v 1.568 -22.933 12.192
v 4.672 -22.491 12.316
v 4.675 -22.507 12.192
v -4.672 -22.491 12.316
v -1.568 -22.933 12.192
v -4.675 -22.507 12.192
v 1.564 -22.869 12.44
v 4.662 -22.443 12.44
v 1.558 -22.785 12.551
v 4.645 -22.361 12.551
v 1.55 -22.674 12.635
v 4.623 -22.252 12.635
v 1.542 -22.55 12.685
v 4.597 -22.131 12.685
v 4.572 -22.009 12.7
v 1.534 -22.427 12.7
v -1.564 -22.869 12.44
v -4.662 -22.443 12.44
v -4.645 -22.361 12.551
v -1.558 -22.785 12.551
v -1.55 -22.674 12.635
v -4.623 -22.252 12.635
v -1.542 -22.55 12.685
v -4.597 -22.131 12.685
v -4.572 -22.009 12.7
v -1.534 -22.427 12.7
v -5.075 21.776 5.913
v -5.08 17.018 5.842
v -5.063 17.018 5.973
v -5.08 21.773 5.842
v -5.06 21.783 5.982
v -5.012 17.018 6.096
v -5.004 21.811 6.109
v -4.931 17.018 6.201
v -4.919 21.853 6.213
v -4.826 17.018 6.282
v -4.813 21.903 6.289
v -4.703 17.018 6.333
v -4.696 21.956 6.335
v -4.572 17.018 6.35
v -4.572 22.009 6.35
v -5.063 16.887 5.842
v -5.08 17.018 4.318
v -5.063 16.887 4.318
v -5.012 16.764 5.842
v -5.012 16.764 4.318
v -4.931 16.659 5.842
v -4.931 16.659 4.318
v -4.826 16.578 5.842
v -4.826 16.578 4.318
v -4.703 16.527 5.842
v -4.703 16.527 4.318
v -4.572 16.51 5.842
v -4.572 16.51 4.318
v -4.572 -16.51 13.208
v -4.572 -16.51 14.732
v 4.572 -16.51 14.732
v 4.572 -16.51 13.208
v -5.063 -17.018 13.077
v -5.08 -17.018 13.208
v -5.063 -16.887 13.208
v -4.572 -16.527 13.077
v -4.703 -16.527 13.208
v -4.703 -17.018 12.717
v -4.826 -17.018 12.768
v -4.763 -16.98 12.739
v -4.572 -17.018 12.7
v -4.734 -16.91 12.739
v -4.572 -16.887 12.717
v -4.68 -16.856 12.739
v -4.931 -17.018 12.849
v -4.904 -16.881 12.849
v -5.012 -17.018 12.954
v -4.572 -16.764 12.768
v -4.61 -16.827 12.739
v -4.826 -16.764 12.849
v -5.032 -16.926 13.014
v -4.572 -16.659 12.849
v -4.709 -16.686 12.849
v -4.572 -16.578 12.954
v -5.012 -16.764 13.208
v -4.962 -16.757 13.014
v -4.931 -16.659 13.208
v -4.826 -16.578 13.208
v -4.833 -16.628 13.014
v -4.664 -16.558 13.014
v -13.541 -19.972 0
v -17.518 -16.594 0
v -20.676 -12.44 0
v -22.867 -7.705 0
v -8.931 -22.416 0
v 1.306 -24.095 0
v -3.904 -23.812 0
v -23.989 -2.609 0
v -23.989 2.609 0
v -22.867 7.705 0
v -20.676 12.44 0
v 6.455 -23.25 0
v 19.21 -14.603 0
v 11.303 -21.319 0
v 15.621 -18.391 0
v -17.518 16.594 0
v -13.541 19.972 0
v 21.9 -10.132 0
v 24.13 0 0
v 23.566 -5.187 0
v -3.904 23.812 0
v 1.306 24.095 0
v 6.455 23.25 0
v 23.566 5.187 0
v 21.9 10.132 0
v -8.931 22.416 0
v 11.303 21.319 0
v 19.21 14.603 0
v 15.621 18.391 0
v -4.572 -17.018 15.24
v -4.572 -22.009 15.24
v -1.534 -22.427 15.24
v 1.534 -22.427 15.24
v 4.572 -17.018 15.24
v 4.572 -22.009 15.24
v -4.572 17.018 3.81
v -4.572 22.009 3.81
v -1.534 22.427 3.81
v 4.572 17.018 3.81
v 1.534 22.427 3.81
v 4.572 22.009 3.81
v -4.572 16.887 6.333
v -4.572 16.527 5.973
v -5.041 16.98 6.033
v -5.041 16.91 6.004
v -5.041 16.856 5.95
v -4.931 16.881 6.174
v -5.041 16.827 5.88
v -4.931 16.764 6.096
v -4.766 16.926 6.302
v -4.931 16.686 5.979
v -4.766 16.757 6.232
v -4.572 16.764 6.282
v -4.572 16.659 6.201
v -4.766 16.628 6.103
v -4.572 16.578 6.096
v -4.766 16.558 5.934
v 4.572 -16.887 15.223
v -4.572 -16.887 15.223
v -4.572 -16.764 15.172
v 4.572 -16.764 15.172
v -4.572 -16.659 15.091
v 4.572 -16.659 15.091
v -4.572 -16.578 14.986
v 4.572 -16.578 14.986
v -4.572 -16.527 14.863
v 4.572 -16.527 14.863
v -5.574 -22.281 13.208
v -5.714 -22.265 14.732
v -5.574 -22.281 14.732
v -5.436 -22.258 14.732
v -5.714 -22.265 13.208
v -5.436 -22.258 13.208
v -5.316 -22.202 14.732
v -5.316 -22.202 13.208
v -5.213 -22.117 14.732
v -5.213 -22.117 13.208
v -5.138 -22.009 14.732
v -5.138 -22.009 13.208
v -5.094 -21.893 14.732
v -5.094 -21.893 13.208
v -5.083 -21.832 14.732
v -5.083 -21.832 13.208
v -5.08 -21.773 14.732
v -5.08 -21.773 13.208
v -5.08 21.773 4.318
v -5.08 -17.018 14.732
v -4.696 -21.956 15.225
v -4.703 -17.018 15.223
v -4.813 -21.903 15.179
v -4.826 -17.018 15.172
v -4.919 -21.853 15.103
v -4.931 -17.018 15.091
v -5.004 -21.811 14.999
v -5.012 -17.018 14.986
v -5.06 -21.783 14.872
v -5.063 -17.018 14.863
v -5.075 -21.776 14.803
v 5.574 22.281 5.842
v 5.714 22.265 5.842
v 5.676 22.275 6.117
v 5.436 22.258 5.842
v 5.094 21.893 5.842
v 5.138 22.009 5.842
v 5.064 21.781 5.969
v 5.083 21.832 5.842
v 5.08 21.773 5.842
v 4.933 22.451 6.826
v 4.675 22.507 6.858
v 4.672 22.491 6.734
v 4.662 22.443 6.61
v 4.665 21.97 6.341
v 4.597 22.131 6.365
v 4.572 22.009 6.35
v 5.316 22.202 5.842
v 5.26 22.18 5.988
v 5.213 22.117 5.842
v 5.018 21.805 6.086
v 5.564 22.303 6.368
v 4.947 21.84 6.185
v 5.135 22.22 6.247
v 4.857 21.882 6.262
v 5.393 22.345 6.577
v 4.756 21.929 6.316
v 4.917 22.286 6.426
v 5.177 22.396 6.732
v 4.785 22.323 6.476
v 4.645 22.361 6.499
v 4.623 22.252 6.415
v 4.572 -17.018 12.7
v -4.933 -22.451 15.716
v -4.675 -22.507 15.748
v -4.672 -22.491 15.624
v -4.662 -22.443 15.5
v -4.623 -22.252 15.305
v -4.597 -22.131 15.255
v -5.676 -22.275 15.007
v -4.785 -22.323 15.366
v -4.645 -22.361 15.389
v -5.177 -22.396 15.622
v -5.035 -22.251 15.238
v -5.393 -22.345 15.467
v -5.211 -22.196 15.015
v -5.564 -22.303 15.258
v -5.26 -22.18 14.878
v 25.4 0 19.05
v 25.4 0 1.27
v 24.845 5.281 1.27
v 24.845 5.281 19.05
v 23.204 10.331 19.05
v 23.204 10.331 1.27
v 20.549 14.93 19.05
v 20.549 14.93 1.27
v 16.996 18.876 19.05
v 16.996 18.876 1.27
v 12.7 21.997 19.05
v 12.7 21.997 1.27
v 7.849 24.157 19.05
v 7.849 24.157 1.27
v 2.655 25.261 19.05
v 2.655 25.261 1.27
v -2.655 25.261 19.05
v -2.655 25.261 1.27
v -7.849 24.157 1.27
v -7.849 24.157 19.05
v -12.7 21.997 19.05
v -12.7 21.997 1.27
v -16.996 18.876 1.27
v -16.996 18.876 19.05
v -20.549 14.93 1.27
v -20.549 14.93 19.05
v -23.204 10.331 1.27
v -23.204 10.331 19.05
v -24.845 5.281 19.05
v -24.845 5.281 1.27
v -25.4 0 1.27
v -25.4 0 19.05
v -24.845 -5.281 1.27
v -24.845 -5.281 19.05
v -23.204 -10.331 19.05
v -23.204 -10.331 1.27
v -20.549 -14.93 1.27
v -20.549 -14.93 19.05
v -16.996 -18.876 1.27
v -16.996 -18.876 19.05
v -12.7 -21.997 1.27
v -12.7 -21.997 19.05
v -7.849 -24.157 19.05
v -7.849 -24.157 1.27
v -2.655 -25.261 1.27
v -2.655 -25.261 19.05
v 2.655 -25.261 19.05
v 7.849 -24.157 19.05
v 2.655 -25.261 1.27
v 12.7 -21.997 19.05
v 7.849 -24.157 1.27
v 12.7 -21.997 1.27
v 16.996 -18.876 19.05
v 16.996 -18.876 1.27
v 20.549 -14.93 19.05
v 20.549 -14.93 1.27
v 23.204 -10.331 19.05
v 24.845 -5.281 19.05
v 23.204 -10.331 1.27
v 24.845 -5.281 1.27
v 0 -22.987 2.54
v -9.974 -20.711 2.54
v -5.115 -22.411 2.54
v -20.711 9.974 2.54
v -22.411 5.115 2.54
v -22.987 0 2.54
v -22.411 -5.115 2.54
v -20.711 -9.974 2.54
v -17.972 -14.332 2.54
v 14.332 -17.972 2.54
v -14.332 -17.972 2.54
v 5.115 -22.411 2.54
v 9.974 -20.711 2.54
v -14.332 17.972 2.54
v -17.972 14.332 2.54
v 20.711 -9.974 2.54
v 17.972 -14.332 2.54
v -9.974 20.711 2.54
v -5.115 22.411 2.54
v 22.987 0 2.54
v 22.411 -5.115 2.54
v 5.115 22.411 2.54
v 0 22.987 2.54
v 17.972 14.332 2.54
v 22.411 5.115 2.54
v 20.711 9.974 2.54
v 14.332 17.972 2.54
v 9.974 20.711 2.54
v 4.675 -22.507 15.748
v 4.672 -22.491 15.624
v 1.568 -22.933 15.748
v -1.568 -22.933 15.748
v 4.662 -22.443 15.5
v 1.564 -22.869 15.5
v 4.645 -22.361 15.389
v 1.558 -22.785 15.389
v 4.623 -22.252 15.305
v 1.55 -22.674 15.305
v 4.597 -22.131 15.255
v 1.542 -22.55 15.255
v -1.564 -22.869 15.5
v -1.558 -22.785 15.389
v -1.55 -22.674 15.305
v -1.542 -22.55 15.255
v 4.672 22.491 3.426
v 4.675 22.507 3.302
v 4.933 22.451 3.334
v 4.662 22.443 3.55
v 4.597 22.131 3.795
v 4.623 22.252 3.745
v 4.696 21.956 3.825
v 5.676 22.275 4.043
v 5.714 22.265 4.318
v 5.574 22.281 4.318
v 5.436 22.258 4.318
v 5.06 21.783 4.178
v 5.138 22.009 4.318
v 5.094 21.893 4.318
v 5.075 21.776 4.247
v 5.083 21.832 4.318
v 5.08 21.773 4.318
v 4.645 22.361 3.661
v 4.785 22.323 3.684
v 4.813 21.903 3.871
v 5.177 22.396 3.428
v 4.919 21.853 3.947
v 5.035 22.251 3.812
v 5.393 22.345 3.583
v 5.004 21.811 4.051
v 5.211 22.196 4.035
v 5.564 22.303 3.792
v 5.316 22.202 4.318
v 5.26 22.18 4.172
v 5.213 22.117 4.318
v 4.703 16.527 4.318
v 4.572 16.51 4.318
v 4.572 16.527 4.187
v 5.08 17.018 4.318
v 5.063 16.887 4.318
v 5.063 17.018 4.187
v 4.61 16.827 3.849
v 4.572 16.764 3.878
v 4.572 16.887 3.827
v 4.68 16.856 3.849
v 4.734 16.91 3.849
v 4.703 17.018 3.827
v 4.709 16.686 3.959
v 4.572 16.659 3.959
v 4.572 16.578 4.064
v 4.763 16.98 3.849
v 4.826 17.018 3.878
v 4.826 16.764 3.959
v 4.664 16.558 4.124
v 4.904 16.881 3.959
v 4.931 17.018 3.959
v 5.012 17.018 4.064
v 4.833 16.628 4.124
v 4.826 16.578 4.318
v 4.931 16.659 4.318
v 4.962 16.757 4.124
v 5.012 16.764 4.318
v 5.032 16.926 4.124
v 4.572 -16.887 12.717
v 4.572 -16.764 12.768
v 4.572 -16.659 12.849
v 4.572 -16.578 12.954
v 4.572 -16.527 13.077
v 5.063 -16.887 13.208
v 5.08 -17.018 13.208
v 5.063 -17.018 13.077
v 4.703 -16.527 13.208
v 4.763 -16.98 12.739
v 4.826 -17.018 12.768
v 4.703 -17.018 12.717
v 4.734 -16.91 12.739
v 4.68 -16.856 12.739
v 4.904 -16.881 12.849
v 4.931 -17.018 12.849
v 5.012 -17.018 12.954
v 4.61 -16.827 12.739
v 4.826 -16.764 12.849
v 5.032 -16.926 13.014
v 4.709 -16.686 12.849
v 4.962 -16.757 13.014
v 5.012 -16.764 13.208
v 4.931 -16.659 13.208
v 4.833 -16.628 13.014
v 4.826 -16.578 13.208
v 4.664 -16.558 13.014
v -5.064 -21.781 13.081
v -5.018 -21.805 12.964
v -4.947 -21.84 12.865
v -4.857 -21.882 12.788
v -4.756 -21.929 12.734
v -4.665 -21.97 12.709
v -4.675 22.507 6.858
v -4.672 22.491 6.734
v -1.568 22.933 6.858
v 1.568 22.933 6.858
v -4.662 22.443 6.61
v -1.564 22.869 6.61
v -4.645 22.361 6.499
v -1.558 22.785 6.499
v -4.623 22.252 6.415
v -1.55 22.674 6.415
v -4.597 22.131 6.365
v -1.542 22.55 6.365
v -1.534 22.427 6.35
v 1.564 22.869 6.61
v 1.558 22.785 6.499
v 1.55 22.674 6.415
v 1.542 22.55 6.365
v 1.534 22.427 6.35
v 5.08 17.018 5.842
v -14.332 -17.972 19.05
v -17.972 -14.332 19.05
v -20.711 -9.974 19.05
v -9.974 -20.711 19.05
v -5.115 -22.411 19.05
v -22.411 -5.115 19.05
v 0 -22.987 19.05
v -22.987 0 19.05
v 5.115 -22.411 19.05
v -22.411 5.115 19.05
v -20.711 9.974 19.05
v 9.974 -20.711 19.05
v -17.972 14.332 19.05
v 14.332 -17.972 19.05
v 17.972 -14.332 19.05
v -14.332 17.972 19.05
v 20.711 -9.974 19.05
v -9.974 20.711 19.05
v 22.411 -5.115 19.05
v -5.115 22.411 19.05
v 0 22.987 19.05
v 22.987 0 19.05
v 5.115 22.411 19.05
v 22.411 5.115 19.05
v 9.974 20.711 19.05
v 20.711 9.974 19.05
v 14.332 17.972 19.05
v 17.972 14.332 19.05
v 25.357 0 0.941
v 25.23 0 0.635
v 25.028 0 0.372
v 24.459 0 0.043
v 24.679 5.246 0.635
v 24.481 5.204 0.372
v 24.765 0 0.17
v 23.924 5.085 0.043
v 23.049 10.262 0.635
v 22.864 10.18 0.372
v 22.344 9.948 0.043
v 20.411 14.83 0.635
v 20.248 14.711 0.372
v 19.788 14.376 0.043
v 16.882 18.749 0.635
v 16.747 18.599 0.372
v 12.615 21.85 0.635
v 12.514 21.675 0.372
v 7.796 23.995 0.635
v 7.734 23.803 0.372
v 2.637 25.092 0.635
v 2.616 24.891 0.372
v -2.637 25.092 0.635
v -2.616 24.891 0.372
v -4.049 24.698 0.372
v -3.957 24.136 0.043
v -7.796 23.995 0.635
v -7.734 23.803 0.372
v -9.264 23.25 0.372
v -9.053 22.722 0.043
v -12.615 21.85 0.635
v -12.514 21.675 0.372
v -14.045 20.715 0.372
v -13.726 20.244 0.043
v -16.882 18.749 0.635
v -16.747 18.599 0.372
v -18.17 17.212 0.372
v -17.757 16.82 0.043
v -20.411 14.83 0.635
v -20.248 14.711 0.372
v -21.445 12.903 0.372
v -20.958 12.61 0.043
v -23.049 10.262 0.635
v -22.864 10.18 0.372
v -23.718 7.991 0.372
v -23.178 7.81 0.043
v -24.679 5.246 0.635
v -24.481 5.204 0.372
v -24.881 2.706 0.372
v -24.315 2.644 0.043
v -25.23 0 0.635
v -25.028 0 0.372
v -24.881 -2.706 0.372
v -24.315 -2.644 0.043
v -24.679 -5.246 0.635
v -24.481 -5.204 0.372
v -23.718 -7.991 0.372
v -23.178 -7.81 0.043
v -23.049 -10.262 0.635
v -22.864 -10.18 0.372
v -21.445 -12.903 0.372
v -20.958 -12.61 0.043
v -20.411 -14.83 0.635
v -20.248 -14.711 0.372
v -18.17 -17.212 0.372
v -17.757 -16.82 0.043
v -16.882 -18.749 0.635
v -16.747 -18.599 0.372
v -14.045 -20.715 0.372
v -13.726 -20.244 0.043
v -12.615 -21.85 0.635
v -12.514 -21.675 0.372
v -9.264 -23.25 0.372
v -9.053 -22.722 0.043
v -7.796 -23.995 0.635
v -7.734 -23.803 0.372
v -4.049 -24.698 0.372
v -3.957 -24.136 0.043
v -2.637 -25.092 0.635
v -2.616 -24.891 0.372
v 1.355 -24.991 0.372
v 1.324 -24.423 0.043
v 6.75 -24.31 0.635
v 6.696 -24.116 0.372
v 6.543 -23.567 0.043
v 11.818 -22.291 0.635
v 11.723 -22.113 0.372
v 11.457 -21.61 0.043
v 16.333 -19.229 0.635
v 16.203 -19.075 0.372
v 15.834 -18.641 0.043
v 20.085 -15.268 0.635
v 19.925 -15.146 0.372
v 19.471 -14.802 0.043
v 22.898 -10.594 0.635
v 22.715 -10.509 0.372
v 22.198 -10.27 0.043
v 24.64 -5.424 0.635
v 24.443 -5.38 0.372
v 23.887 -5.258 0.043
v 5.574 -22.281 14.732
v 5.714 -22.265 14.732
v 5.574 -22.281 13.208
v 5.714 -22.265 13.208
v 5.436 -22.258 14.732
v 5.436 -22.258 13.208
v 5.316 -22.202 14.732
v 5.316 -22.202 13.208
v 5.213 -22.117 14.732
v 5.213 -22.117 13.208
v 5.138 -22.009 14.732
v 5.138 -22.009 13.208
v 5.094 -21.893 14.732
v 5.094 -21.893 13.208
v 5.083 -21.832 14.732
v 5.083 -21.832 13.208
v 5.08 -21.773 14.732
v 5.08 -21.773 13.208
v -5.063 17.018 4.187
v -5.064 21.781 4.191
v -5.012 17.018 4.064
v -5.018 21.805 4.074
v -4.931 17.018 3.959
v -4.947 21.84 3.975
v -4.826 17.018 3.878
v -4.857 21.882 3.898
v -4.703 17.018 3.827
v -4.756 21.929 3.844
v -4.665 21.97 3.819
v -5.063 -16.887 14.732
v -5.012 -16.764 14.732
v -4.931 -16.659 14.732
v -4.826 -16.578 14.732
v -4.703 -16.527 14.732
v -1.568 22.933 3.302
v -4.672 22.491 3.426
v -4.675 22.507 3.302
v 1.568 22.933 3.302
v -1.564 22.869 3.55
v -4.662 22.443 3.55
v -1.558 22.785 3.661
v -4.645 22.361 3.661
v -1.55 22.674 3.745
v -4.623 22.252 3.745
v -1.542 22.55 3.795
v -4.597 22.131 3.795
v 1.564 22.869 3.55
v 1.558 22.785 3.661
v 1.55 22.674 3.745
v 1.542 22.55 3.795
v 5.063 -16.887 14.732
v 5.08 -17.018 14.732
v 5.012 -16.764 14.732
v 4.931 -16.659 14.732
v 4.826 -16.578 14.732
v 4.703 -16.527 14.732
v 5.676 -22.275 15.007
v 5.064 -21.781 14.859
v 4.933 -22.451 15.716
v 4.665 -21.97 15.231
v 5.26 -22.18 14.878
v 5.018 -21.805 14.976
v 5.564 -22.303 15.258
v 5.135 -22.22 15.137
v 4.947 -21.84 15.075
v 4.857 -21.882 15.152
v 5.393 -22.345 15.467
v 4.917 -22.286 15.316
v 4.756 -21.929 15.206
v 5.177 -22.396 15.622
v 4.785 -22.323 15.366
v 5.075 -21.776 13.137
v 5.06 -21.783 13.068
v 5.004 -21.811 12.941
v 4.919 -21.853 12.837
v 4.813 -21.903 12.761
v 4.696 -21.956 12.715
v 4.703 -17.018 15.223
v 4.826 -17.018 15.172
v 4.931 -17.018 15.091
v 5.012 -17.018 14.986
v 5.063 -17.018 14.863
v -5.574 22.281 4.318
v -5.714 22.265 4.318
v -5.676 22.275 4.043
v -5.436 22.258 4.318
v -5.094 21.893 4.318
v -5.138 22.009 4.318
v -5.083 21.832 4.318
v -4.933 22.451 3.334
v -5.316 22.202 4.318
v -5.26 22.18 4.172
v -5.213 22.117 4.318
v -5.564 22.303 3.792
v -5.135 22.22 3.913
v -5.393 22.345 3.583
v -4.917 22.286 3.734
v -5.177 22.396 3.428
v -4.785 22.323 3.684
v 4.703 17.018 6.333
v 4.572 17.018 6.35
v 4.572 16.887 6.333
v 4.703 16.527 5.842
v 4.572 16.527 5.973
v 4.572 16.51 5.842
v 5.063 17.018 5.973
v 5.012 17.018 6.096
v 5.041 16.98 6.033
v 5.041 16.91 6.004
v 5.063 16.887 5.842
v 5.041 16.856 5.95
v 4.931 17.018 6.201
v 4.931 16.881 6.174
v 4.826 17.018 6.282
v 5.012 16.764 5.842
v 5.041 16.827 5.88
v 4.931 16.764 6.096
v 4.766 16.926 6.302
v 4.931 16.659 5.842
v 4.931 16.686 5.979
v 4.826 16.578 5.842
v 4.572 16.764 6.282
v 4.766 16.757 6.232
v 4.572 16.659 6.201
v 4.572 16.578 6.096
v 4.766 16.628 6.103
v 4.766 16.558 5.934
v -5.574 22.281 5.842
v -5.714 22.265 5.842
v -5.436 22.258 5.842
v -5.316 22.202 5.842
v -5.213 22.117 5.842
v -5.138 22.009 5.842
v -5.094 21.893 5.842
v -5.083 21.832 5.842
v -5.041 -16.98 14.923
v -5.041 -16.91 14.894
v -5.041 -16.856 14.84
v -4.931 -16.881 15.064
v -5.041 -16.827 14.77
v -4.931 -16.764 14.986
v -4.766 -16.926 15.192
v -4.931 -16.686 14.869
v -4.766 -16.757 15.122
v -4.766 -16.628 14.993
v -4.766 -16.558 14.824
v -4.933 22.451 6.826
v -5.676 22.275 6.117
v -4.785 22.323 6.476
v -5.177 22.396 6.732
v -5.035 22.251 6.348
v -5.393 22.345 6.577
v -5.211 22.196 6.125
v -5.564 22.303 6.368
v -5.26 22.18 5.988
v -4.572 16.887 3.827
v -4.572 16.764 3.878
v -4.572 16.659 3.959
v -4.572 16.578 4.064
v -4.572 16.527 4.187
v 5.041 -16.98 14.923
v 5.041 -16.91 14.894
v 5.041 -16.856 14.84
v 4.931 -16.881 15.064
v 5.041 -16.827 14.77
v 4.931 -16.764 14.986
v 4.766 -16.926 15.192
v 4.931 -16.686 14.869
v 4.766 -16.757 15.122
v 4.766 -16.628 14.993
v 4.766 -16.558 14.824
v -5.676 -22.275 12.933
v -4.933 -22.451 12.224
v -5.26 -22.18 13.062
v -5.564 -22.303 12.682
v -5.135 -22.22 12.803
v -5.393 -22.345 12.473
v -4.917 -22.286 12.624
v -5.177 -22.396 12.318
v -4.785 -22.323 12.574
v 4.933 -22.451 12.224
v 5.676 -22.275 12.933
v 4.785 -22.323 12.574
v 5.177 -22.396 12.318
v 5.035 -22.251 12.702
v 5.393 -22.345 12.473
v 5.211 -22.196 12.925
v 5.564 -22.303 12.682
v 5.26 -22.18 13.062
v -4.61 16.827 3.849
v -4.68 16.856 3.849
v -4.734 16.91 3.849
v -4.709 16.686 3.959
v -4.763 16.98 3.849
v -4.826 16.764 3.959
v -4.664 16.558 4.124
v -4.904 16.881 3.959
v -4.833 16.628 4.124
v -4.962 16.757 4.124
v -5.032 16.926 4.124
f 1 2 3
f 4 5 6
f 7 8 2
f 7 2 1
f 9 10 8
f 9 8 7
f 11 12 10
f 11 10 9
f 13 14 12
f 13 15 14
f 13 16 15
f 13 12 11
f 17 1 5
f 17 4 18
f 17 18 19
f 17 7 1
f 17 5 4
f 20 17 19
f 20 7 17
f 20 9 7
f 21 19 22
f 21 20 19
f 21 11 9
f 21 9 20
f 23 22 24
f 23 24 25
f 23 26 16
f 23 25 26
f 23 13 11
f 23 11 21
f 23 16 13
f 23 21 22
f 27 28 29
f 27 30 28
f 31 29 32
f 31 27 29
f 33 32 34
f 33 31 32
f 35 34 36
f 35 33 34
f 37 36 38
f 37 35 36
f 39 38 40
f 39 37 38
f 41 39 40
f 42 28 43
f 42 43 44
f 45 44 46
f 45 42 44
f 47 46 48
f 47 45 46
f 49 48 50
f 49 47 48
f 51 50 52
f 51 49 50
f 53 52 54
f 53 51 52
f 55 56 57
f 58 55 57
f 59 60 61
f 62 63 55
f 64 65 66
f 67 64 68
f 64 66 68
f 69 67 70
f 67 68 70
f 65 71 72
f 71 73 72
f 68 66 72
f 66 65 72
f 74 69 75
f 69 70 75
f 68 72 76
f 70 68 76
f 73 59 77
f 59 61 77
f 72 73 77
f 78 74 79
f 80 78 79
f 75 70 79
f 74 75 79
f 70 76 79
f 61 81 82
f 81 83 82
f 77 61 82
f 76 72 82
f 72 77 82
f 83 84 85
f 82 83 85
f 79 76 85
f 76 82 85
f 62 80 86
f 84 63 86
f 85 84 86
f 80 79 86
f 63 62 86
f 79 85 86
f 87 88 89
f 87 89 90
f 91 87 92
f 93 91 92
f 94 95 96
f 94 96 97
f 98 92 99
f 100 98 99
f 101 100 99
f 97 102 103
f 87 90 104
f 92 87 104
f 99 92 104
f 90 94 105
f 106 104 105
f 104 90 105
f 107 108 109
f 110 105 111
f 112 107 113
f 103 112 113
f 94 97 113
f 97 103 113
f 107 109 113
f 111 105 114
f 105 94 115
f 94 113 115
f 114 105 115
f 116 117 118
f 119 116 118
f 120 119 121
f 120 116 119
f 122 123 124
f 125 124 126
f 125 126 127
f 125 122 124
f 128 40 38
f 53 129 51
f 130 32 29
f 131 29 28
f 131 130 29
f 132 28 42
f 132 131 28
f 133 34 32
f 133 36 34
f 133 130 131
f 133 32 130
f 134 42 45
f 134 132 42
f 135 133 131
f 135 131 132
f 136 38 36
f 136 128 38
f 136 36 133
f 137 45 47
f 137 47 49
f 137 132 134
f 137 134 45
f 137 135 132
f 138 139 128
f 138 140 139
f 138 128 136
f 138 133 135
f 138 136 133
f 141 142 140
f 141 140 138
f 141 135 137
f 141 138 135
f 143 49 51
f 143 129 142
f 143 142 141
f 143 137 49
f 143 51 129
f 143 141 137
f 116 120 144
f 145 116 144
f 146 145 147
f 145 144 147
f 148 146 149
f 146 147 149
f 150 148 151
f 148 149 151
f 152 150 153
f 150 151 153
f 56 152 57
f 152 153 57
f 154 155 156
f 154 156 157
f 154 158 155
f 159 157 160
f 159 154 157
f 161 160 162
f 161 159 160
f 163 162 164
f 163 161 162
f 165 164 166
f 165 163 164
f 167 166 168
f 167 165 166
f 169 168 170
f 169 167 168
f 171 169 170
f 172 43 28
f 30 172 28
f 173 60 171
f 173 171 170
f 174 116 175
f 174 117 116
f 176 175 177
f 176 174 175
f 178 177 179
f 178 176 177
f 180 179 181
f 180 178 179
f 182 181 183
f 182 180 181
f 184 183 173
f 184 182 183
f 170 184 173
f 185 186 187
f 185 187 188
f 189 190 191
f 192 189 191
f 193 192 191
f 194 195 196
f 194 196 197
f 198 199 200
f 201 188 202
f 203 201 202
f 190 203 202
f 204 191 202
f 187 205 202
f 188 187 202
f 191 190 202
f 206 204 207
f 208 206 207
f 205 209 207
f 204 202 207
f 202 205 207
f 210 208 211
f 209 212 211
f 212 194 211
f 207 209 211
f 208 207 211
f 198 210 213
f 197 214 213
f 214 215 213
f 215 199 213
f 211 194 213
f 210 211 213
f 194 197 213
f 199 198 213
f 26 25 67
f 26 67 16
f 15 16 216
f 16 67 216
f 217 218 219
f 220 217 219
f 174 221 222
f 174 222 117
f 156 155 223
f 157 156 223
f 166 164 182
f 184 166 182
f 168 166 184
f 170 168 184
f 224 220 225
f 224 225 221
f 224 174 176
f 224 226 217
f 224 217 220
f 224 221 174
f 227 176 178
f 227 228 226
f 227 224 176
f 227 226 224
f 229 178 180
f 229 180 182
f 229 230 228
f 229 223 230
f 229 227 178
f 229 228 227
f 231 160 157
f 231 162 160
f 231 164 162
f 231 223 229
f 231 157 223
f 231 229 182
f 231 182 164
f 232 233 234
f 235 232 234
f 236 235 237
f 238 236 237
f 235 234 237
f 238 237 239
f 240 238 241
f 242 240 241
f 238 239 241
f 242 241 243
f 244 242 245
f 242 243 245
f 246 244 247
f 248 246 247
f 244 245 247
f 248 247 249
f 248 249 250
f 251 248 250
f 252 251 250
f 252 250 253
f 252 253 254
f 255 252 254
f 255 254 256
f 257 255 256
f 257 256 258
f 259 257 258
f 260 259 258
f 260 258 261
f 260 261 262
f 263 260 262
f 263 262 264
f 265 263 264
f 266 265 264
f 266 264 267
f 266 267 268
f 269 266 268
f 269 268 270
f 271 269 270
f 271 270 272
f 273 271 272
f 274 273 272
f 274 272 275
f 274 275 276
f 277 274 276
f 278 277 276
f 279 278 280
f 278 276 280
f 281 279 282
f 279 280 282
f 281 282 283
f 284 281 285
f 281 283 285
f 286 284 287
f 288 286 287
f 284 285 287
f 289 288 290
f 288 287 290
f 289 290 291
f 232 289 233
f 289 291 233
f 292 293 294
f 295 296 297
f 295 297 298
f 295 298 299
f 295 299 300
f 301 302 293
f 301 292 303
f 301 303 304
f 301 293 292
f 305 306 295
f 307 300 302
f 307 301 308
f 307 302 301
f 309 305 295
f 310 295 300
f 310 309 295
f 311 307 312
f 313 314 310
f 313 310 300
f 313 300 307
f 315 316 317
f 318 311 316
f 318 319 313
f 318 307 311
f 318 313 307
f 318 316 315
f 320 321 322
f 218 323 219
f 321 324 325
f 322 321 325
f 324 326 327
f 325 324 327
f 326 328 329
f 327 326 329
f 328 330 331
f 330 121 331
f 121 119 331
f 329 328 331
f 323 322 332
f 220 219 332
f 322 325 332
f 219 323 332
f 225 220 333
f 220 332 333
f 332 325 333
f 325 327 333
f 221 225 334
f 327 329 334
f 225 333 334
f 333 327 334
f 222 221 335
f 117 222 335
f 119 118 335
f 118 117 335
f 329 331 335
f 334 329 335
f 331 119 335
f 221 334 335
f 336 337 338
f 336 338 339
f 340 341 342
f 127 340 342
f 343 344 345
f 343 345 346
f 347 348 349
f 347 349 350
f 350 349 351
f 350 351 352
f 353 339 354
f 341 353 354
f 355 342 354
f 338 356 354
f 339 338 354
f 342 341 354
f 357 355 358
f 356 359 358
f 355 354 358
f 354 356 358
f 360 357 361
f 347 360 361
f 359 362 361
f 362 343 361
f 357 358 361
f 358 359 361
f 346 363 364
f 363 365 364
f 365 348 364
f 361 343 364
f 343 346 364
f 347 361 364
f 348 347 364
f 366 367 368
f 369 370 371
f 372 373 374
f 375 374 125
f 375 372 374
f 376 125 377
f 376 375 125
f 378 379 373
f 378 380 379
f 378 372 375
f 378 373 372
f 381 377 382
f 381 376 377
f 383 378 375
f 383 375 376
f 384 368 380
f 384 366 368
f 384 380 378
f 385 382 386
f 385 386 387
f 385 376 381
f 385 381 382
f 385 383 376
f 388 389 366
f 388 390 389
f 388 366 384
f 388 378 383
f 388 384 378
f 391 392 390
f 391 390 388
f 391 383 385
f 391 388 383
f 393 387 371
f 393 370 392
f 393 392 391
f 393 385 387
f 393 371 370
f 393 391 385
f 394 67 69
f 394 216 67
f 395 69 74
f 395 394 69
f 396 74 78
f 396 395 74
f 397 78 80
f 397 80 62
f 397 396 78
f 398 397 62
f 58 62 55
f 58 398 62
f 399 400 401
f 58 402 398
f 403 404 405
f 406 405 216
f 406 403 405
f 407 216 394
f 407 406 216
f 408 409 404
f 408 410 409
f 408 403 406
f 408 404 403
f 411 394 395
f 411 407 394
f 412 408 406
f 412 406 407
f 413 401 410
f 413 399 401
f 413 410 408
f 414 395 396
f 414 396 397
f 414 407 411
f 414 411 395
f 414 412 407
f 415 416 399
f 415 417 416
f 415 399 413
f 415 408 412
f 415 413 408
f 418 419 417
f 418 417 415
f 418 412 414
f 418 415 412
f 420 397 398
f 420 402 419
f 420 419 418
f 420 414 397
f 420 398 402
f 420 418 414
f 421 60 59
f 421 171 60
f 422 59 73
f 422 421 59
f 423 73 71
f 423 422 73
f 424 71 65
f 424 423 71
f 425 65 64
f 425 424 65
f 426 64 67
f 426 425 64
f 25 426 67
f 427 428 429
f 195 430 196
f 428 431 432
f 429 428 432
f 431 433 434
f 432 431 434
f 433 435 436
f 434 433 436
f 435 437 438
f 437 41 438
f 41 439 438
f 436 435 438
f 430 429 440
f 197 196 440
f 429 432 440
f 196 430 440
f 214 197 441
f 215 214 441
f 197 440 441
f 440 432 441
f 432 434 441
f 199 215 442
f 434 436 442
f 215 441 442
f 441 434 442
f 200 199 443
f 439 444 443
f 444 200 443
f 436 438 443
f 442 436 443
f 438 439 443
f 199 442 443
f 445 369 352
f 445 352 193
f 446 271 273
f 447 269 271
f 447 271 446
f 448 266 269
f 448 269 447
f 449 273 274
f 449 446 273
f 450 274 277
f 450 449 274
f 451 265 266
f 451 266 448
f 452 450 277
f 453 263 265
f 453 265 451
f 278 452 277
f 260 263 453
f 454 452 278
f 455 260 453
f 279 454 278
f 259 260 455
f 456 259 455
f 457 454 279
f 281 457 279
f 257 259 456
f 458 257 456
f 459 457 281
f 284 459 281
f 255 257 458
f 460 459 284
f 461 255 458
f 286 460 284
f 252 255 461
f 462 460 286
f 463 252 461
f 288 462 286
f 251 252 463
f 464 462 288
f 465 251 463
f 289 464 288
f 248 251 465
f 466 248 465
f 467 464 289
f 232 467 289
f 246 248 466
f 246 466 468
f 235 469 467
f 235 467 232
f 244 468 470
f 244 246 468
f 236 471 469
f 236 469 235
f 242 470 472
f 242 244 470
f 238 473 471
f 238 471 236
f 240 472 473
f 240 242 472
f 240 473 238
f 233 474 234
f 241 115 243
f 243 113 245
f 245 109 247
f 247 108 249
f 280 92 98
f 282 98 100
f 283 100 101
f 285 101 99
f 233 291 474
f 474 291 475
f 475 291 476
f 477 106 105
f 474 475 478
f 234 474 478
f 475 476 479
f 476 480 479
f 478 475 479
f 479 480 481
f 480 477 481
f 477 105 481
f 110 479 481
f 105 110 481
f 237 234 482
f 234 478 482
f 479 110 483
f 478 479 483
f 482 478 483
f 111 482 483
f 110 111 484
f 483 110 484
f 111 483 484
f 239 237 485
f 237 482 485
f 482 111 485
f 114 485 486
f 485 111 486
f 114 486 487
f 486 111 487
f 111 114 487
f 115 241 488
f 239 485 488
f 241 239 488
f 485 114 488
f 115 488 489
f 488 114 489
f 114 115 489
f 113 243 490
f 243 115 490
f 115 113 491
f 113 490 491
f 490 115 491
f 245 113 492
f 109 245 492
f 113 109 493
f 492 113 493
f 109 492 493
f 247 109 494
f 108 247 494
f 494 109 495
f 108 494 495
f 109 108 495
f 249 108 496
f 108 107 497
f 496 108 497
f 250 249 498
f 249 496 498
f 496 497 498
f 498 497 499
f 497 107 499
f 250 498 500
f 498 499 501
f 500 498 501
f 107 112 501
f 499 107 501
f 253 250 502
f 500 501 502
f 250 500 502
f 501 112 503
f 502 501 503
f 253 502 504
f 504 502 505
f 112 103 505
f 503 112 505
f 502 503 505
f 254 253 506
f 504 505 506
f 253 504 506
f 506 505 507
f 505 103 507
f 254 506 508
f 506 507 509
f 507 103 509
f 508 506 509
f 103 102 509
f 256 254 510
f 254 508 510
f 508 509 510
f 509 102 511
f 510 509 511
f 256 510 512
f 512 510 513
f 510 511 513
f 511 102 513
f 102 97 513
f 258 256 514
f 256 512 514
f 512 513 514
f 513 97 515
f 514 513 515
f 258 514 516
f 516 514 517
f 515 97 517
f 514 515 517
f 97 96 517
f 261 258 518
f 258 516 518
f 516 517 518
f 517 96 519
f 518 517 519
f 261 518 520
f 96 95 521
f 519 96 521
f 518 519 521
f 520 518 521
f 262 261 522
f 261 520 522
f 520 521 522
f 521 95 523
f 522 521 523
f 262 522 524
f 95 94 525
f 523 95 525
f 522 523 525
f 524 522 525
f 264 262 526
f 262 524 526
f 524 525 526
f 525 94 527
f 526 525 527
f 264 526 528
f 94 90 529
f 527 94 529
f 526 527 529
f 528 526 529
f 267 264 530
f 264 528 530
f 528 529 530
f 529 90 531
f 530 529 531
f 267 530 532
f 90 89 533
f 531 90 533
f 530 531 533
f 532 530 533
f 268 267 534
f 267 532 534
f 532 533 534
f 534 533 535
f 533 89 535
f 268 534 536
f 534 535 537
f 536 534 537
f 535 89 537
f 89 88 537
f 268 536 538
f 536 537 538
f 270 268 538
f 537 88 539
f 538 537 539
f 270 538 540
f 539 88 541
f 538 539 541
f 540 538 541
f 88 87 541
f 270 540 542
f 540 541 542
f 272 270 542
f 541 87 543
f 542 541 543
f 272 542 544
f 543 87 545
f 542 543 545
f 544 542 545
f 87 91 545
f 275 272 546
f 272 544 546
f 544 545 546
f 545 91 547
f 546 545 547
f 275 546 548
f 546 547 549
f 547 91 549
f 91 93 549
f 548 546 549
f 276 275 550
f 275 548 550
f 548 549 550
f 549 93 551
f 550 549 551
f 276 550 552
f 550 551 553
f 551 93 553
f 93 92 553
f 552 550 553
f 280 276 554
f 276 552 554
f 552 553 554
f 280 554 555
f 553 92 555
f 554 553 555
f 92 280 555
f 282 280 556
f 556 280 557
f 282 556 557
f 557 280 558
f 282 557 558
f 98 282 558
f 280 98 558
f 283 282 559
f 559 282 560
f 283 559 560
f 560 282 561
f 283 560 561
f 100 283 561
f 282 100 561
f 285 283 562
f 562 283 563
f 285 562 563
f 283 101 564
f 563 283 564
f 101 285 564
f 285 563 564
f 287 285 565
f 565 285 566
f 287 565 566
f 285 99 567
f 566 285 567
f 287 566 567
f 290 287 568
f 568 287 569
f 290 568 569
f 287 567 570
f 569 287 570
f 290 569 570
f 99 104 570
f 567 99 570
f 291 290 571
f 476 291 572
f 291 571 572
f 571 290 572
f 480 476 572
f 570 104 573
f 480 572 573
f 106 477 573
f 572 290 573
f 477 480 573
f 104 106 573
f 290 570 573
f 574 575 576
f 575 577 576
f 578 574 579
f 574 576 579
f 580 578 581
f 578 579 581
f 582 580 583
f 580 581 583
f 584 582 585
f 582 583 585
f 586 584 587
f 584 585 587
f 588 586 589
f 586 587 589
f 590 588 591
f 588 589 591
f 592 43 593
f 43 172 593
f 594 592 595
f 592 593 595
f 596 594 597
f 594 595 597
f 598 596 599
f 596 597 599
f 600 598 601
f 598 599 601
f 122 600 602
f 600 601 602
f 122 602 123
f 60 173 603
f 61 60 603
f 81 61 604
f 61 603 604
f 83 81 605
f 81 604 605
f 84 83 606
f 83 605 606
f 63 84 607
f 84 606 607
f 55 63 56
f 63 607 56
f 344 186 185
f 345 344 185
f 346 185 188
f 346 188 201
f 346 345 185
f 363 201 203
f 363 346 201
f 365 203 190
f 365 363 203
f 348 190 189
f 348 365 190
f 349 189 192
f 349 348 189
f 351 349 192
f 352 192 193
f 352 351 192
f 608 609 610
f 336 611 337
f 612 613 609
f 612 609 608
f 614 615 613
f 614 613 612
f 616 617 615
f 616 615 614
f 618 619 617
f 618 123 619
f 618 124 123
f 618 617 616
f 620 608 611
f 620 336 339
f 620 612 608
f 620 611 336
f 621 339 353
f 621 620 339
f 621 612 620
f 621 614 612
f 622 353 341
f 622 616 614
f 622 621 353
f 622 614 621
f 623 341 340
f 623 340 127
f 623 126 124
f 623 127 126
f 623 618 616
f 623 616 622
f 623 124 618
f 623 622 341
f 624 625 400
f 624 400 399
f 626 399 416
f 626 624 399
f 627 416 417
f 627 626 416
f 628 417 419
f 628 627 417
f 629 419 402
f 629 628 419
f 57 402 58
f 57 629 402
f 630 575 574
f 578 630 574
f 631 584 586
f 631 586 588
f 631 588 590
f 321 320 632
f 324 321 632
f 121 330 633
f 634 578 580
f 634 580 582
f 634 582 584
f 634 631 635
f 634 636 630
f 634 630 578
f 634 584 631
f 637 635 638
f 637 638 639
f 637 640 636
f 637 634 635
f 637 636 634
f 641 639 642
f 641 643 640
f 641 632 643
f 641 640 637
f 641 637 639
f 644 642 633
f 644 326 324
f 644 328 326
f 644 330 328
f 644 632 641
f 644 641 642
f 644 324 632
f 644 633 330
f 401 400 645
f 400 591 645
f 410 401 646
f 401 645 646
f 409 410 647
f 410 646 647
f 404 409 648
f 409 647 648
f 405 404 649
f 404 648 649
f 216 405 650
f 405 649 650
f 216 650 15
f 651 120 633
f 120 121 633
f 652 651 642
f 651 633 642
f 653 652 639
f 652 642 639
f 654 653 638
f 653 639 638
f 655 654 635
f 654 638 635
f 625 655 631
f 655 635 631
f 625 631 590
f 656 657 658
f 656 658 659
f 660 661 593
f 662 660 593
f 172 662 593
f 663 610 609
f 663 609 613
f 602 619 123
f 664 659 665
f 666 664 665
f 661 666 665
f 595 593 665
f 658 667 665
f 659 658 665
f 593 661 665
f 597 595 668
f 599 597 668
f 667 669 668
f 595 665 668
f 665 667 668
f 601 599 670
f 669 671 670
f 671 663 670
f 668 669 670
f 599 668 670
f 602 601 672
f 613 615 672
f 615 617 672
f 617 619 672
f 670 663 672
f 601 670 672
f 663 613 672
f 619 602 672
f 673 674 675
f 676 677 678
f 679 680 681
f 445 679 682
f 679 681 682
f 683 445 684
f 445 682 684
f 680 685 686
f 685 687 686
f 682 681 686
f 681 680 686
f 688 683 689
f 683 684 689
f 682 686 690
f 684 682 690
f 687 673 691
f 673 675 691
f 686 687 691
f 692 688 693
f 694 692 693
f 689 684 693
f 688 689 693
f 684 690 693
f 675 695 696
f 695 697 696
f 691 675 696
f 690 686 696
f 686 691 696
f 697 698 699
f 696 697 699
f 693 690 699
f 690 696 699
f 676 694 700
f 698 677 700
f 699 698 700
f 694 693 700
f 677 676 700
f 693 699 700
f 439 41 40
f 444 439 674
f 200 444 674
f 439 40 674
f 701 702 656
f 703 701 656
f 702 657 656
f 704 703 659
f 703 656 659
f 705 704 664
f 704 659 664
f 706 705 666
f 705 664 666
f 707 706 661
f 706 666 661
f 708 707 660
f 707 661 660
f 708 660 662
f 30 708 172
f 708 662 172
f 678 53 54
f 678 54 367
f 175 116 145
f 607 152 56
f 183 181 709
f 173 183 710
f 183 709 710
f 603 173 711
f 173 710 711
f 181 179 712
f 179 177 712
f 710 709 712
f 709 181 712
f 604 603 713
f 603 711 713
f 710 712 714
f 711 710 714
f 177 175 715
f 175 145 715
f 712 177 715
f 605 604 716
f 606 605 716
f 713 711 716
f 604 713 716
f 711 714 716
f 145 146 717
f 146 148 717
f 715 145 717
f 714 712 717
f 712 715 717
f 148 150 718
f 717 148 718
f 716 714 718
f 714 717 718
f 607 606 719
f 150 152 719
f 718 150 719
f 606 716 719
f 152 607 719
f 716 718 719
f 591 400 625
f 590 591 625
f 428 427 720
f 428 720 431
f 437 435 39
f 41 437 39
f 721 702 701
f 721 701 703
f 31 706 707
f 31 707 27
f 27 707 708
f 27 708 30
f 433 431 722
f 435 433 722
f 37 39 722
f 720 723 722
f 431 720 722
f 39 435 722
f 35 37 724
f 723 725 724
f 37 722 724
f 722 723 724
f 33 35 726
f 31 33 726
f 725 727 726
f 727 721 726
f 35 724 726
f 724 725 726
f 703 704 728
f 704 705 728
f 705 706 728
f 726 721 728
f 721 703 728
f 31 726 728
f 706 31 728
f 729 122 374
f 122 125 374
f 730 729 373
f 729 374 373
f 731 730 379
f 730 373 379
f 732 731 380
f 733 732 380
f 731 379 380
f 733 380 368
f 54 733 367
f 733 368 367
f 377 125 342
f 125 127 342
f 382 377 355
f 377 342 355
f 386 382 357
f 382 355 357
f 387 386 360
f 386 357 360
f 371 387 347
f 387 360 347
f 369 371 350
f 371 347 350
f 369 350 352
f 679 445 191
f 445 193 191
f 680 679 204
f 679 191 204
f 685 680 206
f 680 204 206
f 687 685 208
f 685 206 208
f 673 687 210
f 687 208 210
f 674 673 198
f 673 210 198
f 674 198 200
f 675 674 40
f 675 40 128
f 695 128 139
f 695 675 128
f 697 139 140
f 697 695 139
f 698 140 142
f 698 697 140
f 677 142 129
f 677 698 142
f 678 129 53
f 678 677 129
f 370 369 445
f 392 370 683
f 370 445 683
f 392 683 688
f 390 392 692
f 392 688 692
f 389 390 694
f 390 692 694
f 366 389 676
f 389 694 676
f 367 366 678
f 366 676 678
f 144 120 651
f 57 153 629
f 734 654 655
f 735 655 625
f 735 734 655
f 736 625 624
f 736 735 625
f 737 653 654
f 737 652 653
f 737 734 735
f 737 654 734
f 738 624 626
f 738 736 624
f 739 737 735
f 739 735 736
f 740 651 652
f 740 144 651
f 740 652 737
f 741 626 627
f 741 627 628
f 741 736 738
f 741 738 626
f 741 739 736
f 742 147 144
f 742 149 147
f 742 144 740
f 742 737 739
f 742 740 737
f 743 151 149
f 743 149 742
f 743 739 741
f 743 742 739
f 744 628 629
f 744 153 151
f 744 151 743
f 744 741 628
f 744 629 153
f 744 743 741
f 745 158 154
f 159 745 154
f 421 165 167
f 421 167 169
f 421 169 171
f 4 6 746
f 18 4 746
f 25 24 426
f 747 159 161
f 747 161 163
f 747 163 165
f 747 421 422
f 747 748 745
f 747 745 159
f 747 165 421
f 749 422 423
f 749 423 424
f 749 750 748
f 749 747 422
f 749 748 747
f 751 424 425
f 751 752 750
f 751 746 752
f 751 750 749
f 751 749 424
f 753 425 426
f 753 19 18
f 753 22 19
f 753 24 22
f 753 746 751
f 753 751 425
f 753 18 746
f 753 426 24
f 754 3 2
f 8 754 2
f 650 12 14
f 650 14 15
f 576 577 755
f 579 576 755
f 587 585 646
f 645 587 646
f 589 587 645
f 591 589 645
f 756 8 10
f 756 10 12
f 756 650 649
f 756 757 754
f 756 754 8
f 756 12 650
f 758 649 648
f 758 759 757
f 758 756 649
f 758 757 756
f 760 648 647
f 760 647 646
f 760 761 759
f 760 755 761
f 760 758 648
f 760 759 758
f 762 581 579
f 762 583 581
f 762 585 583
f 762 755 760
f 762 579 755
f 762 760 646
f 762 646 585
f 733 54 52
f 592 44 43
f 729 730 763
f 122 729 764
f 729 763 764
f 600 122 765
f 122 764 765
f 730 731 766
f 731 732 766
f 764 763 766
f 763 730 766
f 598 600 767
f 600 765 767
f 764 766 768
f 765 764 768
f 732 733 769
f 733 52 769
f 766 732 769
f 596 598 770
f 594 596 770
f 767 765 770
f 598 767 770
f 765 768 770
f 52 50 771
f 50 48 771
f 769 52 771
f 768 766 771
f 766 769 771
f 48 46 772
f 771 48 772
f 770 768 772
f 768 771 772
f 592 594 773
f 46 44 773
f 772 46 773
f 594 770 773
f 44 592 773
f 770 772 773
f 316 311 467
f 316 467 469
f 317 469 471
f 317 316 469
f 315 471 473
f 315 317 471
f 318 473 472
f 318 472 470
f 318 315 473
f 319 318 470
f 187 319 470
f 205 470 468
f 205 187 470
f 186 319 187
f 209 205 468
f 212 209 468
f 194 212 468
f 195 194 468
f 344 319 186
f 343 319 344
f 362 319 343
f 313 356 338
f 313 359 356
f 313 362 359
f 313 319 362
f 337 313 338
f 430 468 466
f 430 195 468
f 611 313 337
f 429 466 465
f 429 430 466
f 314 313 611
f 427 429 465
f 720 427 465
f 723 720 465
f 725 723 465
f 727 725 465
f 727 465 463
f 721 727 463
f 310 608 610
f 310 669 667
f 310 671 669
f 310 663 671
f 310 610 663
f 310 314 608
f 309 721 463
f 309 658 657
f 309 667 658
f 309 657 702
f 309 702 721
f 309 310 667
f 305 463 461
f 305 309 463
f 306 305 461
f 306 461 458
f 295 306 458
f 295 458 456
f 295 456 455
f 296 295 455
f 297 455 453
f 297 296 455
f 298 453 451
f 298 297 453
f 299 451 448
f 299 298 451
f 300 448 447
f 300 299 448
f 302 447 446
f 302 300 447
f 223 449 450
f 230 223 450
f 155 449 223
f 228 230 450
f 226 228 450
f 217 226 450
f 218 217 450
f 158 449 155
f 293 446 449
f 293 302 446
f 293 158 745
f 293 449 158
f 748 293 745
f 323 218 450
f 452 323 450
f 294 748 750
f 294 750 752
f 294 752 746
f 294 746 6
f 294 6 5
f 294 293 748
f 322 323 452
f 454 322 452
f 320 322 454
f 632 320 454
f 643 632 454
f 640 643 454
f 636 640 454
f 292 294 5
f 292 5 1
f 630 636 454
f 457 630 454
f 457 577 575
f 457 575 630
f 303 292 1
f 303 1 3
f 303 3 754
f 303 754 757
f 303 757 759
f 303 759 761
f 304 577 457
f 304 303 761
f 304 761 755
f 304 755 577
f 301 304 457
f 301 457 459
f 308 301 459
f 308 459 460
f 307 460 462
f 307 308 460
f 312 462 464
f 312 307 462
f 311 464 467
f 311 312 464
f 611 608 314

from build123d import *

# Parameters (mm, degrees)
F0_R     = 25.4
F1_DEPTH = 2.54
F2_R     = 25.4
F2_R_2   = 22.987
F3_DEPTH = 16.51
F6_W     = 10.16
F6_H     = 2.54
F8_W     = 10.16
F8_H     = 2.54
F10_R    = 1.27
F11_R    = 0.508


with BuildPart() as f1:
    # F0 (on Top) → F1 (new body)
    with BuildSketch(Plane.XY):
        Circle(F0_R)
    extrude(amount=F1_DEPTH)

    # F2 (on face) → F3 (join)
    with BuildSketch(Plane.XY.offset(2.54)):
        Circle(F2_R)
        Circle(F2_R_2, mode=Mode.SUBTRACT)
    extrude(amount=F3_DEPTH)

    # F6 (on offset) → F7 (join, up to the next surface of F1)
    with BuildSketch(Plane.XZ.offset(16.51)):
        with Locations((0, 13.97)):
            Rectangle(F6_W, F6_H)
    extrude(until=Until.NEXT)

    # F8 (on offset) → F9 (join, up to the next surface of F1)
    with BuildSketch(Plane.XZ.offset(-16.51)):
        with Locations((0, 5.08)):
            Rectangle(F8_W, F8_H)
    extrude(until=Until.NEXT, dir=(0, 1, 0))

    # F10
    f10_edges = [f1.edges().sort_by_distance(p)[0] for p in [
        (-25.4, 0, 0),
    ]]
    fillet(f10_edges, radius=F10_R)

    # F11
    f11_edges = [f1.edges().sort_by_distance(p)[0] for p in [
        (0, -16.51, 15.24),
        (-5.08, -19.464324, 15.24),
        (0, -22.987, 15.24),
        (5.08, -19.464324, 15.24),
        (-5.08, -16.51, 13.97),
        (-5.08, -19.464324, 12.7),
        (-5.08, -22.418648, 13.97),
        (5.08, -16.51, 13.97),
        (5.08, -22.418648, 13.97),
        (5.08, -19.464324, 12.7),
        (0, -16.51, 12.7),
        (25.028026, 0, 0.371974),
        (-25.4, 0, 1.27),
        (-24.13, 0, 0),
        (0, 16.51, 6.35),
        (-5.08, 19.464324, 6.35),
        (0, 22.987, 6.35),
        (5.08, 19.464324, 6.35),
        (5.08, 16.51, 5.08),
        (-5.08, 16.51, 5.08),
        (0, 16.51, 3.81),
        (5.08, 22.418648, 5.08),
        (5.08, 19.464324, 3.81),
        (-5.08, 19.464324, 3.81),
        (-5.08, 22.418648, 5.08),
        (0, -22.987, 12.7),
        (0, 22.987, 3.81),
    ]]
    fillet(f11_edges, radius=F11_R)


solid = f1.part
